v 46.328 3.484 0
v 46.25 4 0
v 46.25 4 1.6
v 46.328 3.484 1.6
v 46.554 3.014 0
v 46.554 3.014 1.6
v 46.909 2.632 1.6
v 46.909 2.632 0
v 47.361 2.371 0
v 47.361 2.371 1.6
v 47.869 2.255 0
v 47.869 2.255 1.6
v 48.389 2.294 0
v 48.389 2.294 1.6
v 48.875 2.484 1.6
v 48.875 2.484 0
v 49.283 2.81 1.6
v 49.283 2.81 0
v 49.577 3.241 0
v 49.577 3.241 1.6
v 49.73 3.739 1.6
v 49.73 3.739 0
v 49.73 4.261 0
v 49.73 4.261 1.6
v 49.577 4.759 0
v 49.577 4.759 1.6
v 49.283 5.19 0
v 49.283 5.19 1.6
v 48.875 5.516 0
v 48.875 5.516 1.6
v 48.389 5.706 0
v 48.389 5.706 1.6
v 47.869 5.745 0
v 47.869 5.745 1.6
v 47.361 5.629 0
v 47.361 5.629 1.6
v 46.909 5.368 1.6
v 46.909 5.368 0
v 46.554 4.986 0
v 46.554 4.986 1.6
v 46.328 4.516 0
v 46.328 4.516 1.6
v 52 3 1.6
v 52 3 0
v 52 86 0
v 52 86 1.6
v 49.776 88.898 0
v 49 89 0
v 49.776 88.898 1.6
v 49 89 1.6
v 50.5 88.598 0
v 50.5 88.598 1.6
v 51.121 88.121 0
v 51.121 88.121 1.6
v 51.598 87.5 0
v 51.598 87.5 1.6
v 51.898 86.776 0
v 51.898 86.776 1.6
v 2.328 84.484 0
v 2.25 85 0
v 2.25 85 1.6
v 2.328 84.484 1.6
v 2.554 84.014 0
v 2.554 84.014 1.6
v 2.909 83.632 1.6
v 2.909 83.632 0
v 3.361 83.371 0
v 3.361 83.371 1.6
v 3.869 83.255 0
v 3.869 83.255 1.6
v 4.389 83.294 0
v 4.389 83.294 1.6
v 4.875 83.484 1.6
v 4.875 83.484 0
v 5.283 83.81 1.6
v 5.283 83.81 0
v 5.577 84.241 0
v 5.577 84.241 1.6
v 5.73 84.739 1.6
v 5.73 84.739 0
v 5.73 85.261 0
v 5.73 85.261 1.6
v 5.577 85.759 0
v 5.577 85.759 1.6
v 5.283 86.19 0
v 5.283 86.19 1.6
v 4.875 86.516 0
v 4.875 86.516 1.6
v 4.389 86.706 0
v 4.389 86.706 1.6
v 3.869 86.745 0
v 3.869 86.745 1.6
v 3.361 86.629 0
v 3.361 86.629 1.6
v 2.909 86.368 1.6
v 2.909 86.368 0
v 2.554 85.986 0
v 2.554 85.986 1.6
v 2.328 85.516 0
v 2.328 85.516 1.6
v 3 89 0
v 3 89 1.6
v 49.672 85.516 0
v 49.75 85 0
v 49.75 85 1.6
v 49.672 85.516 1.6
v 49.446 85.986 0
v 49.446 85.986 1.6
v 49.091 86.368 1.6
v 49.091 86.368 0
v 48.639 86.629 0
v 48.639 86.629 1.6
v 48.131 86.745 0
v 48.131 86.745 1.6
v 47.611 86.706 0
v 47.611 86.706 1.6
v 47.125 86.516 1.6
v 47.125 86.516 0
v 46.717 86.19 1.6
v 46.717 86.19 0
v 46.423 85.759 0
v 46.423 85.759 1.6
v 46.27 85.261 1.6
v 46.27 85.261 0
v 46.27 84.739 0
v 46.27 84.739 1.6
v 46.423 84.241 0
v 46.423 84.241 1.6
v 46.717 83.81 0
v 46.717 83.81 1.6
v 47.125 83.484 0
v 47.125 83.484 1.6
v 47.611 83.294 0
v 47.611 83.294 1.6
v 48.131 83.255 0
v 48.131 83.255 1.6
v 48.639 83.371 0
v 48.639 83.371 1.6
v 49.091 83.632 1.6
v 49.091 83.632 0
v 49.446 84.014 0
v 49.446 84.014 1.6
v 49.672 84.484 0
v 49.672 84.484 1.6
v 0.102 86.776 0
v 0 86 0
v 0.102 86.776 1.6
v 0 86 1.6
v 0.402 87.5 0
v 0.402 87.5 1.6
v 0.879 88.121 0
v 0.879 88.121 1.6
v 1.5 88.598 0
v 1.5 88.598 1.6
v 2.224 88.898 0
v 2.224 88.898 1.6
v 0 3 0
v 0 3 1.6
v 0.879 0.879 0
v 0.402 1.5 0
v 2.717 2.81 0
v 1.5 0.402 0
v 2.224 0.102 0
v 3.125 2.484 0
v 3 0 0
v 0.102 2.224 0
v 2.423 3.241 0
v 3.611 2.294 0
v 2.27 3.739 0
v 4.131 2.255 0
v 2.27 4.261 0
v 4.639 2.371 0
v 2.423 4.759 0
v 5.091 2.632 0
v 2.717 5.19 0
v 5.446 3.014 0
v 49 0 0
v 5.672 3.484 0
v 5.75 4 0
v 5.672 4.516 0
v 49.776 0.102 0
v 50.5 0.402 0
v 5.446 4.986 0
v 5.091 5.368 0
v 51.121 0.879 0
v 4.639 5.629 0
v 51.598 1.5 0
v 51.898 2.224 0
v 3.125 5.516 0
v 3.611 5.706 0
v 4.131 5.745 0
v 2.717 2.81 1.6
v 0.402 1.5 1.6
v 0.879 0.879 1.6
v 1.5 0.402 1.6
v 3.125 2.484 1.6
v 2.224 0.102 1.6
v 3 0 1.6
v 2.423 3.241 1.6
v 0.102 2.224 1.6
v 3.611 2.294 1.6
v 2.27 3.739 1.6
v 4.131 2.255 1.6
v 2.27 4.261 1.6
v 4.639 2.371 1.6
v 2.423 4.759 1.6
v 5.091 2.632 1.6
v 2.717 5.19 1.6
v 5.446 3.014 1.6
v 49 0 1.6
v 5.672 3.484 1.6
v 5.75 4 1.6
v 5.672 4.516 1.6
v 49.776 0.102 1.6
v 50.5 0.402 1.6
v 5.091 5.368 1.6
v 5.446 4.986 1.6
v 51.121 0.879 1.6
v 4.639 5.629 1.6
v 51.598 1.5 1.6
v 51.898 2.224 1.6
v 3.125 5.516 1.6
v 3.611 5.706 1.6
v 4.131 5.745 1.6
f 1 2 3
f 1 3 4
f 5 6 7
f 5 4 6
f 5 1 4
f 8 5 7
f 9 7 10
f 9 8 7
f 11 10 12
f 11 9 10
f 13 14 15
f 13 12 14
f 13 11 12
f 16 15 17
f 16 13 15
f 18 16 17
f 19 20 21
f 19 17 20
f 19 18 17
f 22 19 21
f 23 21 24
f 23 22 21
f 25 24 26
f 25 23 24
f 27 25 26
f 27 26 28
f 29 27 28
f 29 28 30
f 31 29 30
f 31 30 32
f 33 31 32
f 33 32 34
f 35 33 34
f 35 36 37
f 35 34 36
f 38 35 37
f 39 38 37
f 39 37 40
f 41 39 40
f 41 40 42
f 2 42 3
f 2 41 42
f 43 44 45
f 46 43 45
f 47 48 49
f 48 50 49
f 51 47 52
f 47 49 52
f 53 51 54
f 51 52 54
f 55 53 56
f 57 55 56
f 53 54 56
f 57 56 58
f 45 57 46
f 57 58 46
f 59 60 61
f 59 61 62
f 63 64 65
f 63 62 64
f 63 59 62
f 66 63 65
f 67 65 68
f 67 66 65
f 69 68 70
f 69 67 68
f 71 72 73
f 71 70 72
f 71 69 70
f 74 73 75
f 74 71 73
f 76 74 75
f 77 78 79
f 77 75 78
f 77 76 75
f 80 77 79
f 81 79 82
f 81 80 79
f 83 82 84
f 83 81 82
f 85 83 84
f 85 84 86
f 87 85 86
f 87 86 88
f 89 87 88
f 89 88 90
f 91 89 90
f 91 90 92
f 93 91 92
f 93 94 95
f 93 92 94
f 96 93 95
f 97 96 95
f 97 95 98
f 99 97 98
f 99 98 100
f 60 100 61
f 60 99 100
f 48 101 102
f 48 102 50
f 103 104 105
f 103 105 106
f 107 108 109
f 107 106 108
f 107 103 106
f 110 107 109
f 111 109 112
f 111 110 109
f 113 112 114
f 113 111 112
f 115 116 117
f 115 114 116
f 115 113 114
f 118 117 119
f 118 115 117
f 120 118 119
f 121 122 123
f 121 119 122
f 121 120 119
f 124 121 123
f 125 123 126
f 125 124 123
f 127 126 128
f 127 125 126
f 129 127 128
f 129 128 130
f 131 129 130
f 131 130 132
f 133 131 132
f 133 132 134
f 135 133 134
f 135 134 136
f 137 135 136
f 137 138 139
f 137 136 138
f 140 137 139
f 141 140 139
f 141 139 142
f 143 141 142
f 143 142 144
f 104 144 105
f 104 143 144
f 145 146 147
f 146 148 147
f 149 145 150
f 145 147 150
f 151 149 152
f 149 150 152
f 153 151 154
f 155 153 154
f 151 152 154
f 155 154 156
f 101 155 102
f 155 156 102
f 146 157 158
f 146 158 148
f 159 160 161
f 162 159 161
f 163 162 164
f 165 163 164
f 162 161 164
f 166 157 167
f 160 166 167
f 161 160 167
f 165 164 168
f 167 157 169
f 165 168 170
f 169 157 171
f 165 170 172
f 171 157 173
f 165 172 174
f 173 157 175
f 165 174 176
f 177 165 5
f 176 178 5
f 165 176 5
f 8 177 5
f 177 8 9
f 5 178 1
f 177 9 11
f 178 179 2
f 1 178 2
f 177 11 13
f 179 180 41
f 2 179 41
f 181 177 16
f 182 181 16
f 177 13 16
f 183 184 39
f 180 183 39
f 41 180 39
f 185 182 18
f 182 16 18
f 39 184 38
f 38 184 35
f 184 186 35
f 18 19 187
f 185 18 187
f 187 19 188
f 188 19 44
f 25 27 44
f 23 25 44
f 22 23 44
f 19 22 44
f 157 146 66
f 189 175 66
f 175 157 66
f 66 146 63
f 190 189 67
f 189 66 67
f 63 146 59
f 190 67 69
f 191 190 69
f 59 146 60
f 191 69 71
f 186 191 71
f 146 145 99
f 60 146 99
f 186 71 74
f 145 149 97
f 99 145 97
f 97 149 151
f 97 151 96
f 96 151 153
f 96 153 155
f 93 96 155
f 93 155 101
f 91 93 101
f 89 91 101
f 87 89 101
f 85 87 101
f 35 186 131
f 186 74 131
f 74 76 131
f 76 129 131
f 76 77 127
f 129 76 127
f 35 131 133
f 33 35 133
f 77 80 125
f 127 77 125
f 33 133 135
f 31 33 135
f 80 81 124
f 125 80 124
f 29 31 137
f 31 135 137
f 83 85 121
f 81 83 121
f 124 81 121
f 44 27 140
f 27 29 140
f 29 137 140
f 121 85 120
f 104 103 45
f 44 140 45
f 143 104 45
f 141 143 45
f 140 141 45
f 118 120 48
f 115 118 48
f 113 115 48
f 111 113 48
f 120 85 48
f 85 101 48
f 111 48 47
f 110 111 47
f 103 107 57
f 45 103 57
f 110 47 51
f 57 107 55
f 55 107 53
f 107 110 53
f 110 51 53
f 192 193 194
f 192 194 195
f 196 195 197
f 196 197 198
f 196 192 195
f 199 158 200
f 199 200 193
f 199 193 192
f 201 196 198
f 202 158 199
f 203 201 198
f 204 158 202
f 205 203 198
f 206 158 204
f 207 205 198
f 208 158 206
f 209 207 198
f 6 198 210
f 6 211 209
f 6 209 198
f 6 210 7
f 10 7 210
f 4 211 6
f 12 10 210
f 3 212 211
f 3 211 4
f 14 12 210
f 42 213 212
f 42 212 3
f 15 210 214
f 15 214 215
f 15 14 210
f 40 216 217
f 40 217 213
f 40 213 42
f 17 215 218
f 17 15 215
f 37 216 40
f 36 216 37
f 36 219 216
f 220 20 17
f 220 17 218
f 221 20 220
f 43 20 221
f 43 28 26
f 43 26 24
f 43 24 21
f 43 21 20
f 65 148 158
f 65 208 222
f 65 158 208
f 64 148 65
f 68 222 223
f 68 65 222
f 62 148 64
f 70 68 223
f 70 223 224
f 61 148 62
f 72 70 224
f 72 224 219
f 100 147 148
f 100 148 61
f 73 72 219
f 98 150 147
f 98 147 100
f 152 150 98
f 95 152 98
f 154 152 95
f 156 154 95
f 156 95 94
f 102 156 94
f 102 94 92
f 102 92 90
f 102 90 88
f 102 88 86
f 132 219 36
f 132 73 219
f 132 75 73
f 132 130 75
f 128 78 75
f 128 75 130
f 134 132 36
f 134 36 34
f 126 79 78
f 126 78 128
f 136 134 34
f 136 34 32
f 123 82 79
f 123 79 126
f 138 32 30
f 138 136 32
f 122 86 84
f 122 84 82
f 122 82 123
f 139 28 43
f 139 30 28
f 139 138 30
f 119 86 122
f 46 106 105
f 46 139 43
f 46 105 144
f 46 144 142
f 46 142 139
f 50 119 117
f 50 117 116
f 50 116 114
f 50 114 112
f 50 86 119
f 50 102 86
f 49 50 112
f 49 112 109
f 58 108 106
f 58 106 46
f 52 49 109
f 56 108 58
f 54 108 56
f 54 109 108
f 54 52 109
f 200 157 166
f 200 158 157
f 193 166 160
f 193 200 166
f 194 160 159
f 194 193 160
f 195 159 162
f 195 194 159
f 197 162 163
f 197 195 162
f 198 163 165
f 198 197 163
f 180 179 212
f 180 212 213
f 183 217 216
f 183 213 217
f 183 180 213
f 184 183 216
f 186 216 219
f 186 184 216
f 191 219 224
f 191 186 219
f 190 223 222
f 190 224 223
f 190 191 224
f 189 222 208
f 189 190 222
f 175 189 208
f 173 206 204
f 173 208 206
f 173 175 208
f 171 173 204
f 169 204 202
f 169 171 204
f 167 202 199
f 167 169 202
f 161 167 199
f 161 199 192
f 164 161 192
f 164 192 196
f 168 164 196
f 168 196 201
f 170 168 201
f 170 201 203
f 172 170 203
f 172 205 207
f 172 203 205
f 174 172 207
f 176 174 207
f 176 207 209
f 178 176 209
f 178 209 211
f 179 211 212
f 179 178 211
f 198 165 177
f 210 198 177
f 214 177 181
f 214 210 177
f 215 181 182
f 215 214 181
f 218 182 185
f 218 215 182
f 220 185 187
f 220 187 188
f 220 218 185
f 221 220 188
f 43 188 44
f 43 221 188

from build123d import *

# Parameters (mm, degrees)
ESQUISSE1_W                  = 52
ESQUISSE1_H                  = 89
BOSS_EXTRU_1_DEPTH           = 1.6
ENL_V_MAT_EXTRU_1_DEPTH      = 104.090057717
ENL_V_MAT_EXTRU_1_DEPTH_BACK = 104.090057717
ESQUISSE2_R                  = 1.75
CONG_1_R                     = 3


with BuildPart() as part:
    # Esquisse1 → Boss.-Extru.1 (new body)
    with BuildSketch(Plane.XY):
        with Locations((26, 44.5)):
            Rectangle(ESQUISSE1_W, ESQUISSE1_H)
    extrude(amount=BOSS_EXTRU_1_DEPTH)

    # Esquisse2 → Enlèv. mat.-Extru.1 (cut, two sides: drawn at the far end of the back side and taken through both)
    with BuildSketch(Plane.XY.offset(1.6).offset(-ENL_V_MAT_EXTRU_1_DEPTH_BACK)):
        with Locations((48, 85)):
            Circle(ESQUISSE2_R)
        with Locations(Location((48, 4, 0), (0, 0, 180))):
            Circle(ESQUISSE2_R)
        with Locations((4, 4)):
            Circle(ESQUISSE2_R)
        with Locations(Location((4, 85, 0), (0, 0, 180))):
            Circle(ESQUISSE2_R)
    extrude(amount=ENL_V_MAT_EXTRU_1_DEPTH + ENL_V_MAT_EXTRU_1_DEPTH_BACK, mode=Mode.SUBTRACT)

    # Congé1
    cong_1_edges = [part.edges().sort_by_distance(p)[0] for p in [
        (0, 89, 0.8),
        (52, 89, 0.8),
        (52, 0, 0.8),
        (0, 0, 0.8),
    ]]
    fillet(cong_1_edges, radius=CONG_1_R)


solid = part.part
